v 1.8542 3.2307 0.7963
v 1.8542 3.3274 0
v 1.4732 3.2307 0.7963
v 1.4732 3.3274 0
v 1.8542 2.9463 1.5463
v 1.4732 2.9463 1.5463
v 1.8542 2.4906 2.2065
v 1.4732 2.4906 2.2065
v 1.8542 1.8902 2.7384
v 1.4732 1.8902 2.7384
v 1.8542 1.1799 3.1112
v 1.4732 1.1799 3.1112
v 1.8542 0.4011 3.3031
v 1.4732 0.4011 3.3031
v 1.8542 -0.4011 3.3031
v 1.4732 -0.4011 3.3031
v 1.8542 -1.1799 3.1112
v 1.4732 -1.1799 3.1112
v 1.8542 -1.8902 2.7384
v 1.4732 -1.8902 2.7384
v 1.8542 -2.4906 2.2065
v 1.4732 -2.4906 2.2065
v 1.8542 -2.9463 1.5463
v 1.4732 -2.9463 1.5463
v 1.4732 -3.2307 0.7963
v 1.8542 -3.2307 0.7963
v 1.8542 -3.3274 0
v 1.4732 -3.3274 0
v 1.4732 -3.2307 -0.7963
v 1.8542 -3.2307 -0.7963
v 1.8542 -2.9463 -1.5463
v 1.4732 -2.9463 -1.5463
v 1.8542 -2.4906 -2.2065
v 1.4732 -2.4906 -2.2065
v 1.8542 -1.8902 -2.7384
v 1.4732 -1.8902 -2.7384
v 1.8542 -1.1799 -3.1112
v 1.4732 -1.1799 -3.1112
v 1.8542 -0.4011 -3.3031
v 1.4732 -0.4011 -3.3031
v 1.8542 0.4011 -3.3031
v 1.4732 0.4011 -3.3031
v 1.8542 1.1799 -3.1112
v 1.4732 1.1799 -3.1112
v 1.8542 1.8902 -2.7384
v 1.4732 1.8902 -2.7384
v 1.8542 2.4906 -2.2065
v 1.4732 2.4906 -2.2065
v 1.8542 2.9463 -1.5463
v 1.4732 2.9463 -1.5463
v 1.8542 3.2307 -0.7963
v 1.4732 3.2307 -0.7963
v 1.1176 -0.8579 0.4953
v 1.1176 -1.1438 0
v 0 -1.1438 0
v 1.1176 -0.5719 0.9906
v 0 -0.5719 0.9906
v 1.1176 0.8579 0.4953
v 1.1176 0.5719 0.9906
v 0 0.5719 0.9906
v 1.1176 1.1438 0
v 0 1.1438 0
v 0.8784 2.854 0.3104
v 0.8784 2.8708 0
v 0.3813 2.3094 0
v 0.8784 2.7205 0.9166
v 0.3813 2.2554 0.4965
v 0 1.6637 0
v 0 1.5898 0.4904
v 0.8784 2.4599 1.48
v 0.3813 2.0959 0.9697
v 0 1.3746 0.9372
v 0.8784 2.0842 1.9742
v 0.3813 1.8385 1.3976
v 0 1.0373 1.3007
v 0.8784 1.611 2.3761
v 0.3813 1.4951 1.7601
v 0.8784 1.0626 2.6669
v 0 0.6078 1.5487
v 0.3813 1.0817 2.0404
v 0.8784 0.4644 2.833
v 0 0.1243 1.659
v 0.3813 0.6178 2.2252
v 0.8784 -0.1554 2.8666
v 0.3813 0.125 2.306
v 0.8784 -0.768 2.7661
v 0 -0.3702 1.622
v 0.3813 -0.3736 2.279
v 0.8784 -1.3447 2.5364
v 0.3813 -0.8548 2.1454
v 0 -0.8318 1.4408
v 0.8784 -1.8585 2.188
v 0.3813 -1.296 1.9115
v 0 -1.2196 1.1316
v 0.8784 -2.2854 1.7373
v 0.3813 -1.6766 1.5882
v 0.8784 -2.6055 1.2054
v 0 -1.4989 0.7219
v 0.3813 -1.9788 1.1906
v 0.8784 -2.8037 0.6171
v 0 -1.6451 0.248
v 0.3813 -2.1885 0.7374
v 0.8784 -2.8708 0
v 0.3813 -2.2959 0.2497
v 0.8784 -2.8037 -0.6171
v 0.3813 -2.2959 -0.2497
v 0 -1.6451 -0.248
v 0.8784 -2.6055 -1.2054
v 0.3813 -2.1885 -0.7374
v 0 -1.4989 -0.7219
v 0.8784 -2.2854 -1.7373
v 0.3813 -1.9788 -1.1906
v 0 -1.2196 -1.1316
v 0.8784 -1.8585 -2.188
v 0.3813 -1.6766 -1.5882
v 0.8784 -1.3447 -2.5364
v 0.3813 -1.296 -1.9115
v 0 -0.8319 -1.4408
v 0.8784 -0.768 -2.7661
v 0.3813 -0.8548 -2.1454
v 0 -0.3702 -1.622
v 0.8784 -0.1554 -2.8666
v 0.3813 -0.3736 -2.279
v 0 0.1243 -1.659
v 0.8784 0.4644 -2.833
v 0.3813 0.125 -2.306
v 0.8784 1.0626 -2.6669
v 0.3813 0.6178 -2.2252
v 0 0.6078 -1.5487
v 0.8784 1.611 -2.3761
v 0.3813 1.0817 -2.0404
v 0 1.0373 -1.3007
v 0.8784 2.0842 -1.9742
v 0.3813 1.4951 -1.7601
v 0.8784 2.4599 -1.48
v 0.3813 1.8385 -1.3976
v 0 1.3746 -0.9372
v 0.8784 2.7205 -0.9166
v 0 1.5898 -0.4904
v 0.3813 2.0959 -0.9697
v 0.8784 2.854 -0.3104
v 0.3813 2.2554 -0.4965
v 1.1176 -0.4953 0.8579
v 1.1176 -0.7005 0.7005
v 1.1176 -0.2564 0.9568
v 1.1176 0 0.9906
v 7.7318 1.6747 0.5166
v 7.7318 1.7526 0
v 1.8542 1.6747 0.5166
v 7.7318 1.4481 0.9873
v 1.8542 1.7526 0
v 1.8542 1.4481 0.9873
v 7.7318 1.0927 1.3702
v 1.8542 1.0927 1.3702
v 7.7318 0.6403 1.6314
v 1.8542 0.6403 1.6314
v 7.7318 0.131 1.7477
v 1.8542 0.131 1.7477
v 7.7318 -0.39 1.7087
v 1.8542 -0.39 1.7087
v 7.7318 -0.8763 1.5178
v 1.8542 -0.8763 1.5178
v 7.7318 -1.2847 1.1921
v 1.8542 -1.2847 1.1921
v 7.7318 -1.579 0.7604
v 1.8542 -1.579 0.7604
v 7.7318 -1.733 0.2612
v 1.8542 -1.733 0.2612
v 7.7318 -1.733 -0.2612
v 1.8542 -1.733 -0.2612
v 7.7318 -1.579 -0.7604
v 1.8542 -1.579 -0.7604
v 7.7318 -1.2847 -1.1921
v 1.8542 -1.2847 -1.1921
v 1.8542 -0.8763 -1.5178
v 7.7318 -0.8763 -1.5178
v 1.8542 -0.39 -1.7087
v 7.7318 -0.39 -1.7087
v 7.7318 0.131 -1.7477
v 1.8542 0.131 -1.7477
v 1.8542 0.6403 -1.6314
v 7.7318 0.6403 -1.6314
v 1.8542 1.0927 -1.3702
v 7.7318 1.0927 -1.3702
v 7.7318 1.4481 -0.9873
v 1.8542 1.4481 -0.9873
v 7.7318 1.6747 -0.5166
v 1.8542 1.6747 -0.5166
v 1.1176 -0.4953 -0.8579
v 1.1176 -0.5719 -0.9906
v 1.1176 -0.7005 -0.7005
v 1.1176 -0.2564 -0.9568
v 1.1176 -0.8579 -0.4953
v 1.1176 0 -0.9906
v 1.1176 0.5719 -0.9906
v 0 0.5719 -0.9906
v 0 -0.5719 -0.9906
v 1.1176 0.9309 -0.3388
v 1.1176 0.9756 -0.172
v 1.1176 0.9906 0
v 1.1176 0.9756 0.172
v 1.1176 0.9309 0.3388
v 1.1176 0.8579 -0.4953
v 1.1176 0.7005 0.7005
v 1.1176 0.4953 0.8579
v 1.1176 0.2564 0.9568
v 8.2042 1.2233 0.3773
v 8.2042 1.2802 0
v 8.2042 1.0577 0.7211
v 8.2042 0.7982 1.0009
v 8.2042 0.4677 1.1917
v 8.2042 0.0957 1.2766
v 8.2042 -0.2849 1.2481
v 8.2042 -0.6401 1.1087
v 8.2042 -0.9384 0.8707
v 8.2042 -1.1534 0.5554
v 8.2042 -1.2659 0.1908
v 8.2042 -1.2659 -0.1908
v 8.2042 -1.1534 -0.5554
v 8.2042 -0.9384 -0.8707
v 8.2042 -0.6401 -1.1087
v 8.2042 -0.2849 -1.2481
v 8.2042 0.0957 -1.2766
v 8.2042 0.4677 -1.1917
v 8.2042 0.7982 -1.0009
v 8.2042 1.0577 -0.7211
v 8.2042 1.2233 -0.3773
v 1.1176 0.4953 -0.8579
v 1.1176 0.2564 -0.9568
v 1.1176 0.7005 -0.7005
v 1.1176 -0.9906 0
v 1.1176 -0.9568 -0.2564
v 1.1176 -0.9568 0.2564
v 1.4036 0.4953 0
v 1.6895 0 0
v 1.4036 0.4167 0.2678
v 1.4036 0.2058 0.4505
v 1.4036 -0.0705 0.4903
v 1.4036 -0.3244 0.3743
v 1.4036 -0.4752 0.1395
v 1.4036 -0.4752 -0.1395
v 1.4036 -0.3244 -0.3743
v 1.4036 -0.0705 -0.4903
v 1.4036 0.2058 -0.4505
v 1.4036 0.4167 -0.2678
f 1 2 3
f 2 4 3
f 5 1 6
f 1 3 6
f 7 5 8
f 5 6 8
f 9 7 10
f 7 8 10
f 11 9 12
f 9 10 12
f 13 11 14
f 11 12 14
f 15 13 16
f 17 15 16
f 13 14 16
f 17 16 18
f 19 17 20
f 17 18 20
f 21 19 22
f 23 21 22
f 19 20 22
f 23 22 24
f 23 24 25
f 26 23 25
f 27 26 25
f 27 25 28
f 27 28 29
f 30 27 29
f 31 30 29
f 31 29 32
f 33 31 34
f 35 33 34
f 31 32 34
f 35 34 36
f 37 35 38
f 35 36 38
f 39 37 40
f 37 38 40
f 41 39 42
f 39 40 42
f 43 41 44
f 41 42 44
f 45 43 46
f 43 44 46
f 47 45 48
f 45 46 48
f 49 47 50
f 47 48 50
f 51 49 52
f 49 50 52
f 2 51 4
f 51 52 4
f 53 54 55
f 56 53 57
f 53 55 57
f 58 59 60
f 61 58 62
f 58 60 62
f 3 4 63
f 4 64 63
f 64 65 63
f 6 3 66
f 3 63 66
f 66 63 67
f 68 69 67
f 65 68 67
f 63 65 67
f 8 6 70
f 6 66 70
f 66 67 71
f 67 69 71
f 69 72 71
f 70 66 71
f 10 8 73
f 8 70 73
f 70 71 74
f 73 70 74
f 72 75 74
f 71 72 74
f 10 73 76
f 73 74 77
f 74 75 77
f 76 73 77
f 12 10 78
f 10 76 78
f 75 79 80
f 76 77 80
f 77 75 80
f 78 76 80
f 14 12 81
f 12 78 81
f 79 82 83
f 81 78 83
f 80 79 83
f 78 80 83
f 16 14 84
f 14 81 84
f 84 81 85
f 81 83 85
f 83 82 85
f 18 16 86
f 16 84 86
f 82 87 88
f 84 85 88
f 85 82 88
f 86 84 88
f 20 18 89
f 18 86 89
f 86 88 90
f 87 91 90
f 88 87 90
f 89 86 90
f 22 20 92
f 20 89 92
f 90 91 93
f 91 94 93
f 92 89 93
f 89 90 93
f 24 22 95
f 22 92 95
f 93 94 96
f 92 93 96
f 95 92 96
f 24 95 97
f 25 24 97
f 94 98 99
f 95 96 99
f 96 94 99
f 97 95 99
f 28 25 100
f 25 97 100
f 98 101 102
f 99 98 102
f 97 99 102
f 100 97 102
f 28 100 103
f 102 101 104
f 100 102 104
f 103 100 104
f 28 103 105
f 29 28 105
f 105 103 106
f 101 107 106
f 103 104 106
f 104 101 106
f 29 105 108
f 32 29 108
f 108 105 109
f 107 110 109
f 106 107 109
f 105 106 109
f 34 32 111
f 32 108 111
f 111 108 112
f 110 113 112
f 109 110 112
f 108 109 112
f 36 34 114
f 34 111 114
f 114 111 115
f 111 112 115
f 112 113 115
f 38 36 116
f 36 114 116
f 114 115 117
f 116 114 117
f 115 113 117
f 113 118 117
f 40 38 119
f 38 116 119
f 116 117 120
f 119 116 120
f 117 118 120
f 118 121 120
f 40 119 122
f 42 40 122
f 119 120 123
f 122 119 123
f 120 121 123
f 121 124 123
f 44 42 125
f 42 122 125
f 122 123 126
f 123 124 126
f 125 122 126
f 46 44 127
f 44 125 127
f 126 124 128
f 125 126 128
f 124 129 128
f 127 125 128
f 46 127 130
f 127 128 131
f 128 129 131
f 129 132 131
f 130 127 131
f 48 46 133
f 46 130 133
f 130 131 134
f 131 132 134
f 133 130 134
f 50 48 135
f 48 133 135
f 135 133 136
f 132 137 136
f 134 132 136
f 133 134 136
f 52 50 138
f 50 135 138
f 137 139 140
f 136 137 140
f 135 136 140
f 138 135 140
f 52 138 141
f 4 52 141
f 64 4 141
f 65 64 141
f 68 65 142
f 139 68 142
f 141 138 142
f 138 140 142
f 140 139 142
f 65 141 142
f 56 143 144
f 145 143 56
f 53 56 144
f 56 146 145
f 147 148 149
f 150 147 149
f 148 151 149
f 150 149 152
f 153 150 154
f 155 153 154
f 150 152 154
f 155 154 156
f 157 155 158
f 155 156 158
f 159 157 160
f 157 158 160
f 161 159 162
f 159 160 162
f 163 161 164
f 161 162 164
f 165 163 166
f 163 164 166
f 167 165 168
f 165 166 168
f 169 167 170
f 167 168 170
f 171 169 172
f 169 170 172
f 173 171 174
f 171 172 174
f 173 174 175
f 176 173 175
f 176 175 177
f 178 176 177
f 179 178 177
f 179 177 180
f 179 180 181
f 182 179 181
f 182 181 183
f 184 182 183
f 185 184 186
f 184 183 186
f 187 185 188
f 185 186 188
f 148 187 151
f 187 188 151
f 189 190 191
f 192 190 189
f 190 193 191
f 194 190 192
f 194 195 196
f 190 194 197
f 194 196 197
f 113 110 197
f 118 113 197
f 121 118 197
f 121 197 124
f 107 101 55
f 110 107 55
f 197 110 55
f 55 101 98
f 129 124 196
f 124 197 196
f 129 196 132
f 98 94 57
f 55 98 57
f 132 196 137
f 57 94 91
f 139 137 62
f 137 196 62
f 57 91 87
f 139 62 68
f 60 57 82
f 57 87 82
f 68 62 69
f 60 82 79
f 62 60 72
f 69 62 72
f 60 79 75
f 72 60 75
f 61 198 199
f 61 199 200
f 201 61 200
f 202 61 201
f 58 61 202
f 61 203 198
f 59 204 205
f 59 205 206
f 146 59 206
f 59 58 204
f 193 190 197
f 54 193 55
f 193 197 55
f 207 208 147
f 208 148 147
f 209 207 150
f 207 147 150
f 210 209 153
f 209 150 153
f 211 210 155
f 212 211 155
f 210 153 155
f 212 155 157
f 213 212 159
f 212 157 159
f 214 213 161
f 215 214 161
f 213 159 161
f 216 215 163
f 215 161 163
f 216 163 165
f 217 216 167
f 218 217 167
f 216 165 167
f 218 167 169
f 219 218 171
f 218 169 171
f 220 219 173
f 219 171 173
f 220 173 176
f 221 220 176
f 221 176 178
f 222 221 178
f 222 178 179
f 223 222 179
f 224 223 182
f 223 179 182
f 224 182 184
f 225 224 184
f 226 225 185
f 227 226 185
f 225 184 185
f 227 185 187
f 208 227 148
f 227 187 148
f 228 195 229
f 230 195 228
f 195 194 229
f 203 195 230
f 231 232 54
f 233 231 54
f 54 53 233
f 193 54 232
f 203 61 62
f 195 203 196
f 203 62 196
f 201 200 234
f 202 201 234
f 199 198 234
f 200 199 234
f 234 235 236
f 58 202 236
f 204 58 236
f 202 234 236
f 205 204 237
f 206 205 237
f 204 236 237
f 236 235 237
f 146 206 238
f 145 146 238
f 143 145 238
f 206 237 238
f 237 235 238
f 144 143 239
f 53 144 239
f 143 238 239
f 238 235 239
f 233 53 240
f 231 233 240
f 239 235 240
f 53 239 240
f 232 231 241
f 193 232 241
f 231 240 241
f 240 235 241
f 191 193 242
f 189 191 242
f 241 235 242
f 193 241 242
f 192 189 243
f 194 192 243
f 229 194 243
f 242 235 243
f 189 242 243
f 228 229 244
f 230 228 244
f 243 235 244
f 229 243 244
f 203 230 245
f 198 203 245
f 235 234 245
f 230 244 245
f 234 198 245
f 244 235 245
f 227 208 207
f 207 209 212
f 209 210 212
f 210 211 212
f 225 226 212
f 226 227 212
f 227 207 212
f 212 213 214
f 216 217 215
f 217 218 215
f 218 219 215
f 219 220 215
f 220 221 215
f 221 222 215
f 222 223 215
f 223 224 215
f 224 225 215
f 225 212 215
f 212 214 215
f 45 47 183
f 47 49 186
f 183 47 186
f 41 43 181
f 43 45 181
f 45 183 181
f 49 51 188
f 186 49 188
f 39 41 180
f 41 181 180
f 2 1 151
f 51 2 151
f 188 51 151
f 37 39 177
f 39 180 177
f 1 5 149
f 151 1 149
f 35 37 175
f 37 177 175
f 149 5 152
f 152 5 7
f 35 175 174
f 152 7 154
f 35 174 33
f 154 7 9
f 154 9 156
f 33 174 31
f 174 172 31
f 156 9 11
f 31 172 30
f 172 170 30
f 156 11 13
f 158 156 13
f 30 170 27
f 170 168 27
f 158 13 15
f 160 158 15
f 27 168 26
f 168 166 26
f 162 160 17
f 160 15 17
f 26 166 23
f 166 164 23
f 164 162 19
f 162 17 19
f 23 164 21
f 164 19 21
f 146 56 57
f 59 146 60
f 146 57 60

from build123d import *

# Parameters (mm, degrees)
HEX_2_DEPTH = 1.1176


with BuildPart() as part:
    # BodySke → BaseBody (revolve)
    with BuildSketch(Plane.XY):
        with BuildLine():
            Line((8.2042, 0), (8.2042, 1.28016))
            Line((8.2042, 1.28016), (7.73176, 1.7526))
            Line((7.73176, 1.7526), (1.8542, 1.7526))
            Line((1.8542, 1.7526), (1.8542, 3.3274))
            Line((1.8542, 3.3274), (1.4732, 3.3274))
            ThreePointArc((1.4732, 3.3274), (0.616396771, 2.601989501), (0, 1.6637))
            Line((0, 1.6637), (0, 0))
            Line((0, 0), (8.2042, 0))
        make_face()
    revolve(axis=Axis((0, 0, 0), (1, 0, 0)))

    # Sketch2 → PreBroach (revolve, cut)
    with BuildSketch(Plane.XY):
        Polygon((0, 0.9906), (1.1176, 0.9906), (1.689523177, 0), (0, 0), align=None)
    revolve(axis=Axis((0, 0, 0), (1, 0, 0)), mode=Mode.SUBTRACT)

    # Sketch3 → Hex 2 (cut)
    with BuildSketch(Plane(origin=(0, 0, 0), x_dir=(0, 0, -1), z_dir=(1, 0, 0))):
        Polygon((-0.9906, -0.571923177), (-0.9906, 0.571923177), (0, 1.143846353), (0.9906, 0.571923177), (0.9906, -0.571923177), (0, -1.143846353), align=None)
    extrude(amount=HEX_2_DEPTH, mode=Mode.SUBTRACT)


solid = part.part
